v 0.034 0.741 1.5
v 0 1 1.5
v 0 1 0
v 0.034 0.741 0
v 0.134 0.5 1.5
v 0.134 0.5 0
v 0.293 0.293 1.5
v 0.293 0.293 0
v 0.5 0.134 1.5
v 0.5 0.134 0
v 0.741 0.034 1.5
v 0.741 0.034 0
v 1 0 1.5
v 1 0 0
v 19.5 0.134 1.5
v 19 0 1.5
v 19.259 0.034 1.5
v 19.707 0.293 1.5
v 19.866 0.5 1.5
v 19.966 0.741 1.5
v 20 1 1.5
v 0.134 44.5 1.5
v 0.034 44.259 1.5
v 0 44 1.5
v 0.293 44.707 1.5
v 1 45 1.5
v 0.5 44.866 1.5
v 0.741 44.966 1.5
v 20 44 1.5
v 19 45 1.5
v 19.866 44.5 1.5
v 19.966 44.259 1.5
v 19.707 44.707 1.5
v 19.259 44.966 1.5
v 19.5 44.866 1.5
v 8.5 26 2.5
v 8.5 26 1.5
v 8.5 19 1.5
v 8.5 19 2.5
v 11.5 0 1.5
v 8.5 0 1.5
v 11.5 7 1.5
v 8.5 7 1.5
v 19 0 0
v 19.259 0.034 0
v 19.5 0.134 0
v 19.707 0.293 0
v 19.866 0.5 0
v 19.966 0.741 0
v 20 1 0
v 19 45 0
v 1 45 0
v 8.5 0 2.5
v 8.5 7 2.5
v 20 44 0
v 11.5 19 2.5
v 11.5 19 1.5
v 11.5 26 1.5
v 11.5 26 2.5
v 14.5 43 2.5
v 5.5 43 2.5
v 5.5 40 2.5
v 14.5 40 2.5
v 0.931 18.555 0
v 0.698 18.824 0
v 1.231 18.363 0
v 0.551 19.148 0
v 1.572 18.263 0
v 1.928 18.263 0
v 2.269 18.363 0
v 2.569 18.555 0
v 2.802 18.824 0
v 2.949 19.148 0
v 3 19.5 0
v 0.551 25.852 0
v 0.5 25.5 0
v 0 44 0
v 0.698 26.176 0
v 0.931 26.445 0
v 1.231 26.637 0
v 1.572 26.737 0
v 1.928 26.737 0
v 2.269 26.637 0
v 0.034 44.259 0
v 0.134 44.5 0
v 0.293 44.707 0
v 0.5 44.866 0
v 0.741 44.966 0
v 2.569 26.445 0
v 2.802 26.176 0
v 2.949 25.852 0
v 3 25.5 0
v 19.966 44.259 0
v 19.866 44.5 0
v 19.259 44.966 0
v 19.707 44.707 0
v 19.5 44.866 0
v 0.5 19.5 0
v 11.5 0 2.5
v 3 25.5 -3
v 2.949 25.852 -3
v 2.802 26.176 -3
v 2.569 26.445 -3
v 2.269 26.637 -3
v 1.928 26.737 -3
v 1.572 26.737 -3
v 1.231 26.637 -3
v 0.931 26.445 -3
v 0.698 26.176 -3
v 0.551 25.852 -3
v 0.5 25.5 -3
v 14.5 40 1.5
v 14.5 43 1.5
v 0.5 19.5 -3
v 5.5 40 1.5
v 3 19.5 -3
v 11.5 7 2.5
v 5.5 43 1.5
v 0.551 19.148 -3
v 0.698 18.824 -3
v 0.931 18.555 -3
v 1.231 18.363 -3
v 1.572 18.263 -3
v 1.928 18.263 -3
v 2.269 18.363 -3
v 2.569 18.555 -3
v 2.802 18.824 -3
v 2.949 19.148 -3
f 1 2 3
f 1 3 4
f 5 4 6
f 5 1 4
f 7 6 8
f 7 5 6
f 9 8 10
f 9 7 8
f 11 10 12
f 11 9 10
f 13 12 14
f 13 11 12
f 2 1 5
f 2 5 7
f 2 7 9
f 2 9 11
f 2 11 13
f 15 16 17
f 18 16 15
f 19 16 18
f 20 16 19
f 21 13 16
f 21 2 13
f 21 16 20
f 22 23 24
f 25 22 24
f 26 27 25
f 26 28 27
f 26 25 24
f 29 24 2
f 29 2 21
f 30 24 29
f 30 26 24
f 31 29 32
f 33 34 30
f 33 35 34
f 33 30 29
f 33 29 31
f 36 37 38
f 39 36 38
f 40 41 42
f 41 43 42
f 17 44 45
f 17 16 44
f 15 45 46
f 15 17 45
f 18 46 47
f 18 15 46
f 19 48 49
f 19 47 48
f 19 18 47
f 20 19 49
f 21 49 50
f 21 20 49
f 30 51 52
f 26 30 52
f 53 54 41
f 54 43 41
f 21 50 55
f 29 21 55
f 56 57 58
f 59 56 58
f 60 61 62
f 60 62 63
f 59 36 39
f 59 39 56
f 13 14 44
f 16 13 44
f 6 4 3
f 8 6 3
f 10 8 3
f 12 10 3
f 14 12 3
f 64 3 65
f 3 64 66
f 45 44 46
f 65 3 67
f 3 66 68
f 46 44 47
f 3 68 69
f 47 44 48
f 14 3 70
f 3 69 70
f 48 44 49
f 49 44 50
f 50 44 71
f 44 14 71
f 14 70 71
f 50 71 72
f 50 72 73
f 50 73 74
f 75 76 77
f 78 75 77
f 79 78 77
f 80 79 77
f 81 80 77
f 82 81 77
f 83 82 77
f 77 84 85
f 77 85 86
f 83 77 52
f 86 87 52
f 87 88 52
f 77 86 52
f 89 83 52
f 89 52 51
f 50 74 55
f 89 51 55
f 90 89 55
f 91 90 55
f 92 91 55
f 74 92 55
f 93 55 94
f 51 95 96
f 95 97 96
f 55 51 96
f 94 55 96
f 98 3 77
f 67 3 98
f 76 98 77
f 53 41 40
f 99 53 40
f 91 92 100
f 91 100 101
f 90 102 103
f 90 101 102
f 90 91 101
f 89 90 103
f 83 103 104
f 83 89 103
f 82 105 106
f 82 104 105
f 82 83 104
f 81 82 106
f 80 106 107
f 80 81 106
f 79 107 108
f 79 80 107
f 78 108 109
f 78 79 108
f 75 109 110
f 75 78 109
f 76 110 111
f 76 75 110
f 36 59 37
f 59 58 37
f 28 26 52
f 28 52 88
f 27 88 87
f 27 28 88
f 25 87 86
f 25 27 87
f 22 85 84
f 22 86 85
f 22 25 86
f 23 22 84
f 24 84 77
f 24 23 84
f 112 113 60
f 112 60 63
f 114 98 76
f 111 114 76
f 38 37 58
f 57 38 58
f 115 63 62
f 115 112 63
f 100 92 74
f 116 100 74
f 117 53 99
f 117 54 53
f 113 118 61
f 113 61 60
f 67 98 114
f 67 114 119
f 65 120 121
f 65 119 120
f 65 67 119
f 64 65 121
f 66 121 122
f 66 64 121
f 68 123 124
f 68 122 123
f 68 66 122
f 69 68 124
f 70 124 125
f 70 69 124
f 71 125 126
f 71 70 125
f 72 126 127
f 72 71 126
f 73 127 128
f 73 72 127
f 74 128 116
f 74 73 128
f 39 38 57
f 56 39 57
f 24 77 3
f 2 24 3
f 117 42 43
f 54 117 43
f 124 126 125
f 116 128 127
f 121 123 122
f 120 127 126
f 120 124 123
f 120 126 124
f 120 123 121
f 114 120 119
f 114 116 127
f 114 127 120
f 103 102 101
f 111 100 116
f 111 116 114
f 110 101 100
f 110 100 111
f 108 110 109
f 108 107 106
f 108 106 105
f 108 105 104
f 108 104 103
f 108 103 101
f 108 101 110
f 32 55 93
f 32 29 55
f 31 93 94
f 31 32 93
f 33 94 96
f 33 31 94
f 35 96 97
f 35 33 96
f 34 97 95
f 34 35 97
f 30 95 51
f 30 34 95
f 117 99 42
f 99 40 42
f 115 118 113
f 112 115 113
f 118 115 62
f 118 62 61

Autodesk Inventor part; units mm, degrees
ref_plane "YZ Plane" through (0, 0, 0) normal (1, 0, 0) x (0, 1, 0)
ref_plane "XZ Plane" through (0, 0, 0) normal (0, 1, 0) x (-1, 0, 0)
ref_plane "XY Plane" through (0, 0, 0) normal (0, 0, 1) x (1, 0, 0)
sketch "Esboço1" plane through (0, 0, 0) normal (0, 0, 1) x (1, 0, 0)
  line L0 (0, 0) -> (20, 0)
  line L1 (20, 0) -> (20, 45)
  line L2 (20, 45) -> (0, 45)
  line L3 (0, 45) -> (0, 0)
  line L4 (7.3975, 0) -> (10.3975, 0)
  dimension "d0" = 20
  dimension "d1" = 45
extrude "Extrusão1" add sketch "Esboço1" along normal blind 1.5
fillet "Arredondamento1" radius 1 4 edges at (20, 45, 0.75) (20, 0, 0.75) (0, 45, 0.75) (0, 0, 0.75)
sketch "Esboço2" plane through (0, 0, 1.5) normal (0, 0, 1) x (1, 0, 0)
  line L0 (1, 0) -> (19, 0) projected
  line L1 (8.5, 0) -> (11.5, 0)
  line L2 (11.5, 0) -> (11.5, 7)
  line L3 (11.5, 7) -> (8.5, 7)
  line L4 (8.5, 7) -> (8.5, 0)
  line L5 (8.5, 19) -> (11.5, 19)
  line L6 (11.5, 19) -> (11.5, 26)
  line L7 (11.5, 26) -> (8.5, 26)
  line L8 (8.5, 26) -> (8.5, 19)
  line L9 (10, 7) -> (10, 0) construction
  line L10 (0, 44) -> (0, 1) construction
  line L11 (11.5, 22.5) -> (8.5, 22.5) construction
  line L12 (19, 45) -> (1, 45) projected
  line L13 (5.5, 43) -> (14.5, 43)
  line L14 (14.5, 43) -> (14.5, 40)
  line L15 (14.5, 40) -> (5.5, 40)
  line L16 (5.5, 40) -> (5.5, 43)
  point P0 (0, 0)
  dimension "d9" = 3
  dimension "d10" = 7
  dimension "d11" = 3
  dimension "d12" = 7
  dimension "d13" = 10
  dimension "d19" = 12
  dimension "d20" = 9
  dimension "d21" = 3
  dimension "d22" = 2
  dimension "d23" = 5.5
extrude "Extrusão2" add sketch "Esboço2" along normal blind 1 separate body
sketch "Esboço3" plane through (0, 0, 0) normal (0, 0, -1) x (-1, 0, 0)
  line L0 (-20, 1) -> (-20, 44) construction
  line L1 (-1, 0) -> (-19, 0) projected
  line L2 (-1.75, 18.25) -> (-1.75, 26.75) construction
  line L3 (-0.5, 19.5) -> (-0.5, 25.5)
  line L4 (-3, 25.5) -> (-3, 19.5)
  arc A0 (-3, 19.5) -> (-0.5, 19.5) centre (-1.75, 19.5) ccw
  arc A1 (-0.5, 25.5) -> (-3, 25.5) centre (-1.75, 25.5) ccw
  line L5 (0, 44) -> (0, 1) projected
  point P0 (0, 0)
  point P1 (-8.5, 19)
  point P2 (-8.5, 26)
  point P3 (-1.75, 22.5)
  dimension "d30" = 8.5
  dimension "d31" = 2.5
  dimension "d32" = 22.5
  dimension "d33" = 6
  dimension "d34" = 1.25
  dimension "d35" = 0.5
extrude "Extrusão3" add sketch "Esboço3" along normal blind 3 bodies 1
properties part number "Placa"
